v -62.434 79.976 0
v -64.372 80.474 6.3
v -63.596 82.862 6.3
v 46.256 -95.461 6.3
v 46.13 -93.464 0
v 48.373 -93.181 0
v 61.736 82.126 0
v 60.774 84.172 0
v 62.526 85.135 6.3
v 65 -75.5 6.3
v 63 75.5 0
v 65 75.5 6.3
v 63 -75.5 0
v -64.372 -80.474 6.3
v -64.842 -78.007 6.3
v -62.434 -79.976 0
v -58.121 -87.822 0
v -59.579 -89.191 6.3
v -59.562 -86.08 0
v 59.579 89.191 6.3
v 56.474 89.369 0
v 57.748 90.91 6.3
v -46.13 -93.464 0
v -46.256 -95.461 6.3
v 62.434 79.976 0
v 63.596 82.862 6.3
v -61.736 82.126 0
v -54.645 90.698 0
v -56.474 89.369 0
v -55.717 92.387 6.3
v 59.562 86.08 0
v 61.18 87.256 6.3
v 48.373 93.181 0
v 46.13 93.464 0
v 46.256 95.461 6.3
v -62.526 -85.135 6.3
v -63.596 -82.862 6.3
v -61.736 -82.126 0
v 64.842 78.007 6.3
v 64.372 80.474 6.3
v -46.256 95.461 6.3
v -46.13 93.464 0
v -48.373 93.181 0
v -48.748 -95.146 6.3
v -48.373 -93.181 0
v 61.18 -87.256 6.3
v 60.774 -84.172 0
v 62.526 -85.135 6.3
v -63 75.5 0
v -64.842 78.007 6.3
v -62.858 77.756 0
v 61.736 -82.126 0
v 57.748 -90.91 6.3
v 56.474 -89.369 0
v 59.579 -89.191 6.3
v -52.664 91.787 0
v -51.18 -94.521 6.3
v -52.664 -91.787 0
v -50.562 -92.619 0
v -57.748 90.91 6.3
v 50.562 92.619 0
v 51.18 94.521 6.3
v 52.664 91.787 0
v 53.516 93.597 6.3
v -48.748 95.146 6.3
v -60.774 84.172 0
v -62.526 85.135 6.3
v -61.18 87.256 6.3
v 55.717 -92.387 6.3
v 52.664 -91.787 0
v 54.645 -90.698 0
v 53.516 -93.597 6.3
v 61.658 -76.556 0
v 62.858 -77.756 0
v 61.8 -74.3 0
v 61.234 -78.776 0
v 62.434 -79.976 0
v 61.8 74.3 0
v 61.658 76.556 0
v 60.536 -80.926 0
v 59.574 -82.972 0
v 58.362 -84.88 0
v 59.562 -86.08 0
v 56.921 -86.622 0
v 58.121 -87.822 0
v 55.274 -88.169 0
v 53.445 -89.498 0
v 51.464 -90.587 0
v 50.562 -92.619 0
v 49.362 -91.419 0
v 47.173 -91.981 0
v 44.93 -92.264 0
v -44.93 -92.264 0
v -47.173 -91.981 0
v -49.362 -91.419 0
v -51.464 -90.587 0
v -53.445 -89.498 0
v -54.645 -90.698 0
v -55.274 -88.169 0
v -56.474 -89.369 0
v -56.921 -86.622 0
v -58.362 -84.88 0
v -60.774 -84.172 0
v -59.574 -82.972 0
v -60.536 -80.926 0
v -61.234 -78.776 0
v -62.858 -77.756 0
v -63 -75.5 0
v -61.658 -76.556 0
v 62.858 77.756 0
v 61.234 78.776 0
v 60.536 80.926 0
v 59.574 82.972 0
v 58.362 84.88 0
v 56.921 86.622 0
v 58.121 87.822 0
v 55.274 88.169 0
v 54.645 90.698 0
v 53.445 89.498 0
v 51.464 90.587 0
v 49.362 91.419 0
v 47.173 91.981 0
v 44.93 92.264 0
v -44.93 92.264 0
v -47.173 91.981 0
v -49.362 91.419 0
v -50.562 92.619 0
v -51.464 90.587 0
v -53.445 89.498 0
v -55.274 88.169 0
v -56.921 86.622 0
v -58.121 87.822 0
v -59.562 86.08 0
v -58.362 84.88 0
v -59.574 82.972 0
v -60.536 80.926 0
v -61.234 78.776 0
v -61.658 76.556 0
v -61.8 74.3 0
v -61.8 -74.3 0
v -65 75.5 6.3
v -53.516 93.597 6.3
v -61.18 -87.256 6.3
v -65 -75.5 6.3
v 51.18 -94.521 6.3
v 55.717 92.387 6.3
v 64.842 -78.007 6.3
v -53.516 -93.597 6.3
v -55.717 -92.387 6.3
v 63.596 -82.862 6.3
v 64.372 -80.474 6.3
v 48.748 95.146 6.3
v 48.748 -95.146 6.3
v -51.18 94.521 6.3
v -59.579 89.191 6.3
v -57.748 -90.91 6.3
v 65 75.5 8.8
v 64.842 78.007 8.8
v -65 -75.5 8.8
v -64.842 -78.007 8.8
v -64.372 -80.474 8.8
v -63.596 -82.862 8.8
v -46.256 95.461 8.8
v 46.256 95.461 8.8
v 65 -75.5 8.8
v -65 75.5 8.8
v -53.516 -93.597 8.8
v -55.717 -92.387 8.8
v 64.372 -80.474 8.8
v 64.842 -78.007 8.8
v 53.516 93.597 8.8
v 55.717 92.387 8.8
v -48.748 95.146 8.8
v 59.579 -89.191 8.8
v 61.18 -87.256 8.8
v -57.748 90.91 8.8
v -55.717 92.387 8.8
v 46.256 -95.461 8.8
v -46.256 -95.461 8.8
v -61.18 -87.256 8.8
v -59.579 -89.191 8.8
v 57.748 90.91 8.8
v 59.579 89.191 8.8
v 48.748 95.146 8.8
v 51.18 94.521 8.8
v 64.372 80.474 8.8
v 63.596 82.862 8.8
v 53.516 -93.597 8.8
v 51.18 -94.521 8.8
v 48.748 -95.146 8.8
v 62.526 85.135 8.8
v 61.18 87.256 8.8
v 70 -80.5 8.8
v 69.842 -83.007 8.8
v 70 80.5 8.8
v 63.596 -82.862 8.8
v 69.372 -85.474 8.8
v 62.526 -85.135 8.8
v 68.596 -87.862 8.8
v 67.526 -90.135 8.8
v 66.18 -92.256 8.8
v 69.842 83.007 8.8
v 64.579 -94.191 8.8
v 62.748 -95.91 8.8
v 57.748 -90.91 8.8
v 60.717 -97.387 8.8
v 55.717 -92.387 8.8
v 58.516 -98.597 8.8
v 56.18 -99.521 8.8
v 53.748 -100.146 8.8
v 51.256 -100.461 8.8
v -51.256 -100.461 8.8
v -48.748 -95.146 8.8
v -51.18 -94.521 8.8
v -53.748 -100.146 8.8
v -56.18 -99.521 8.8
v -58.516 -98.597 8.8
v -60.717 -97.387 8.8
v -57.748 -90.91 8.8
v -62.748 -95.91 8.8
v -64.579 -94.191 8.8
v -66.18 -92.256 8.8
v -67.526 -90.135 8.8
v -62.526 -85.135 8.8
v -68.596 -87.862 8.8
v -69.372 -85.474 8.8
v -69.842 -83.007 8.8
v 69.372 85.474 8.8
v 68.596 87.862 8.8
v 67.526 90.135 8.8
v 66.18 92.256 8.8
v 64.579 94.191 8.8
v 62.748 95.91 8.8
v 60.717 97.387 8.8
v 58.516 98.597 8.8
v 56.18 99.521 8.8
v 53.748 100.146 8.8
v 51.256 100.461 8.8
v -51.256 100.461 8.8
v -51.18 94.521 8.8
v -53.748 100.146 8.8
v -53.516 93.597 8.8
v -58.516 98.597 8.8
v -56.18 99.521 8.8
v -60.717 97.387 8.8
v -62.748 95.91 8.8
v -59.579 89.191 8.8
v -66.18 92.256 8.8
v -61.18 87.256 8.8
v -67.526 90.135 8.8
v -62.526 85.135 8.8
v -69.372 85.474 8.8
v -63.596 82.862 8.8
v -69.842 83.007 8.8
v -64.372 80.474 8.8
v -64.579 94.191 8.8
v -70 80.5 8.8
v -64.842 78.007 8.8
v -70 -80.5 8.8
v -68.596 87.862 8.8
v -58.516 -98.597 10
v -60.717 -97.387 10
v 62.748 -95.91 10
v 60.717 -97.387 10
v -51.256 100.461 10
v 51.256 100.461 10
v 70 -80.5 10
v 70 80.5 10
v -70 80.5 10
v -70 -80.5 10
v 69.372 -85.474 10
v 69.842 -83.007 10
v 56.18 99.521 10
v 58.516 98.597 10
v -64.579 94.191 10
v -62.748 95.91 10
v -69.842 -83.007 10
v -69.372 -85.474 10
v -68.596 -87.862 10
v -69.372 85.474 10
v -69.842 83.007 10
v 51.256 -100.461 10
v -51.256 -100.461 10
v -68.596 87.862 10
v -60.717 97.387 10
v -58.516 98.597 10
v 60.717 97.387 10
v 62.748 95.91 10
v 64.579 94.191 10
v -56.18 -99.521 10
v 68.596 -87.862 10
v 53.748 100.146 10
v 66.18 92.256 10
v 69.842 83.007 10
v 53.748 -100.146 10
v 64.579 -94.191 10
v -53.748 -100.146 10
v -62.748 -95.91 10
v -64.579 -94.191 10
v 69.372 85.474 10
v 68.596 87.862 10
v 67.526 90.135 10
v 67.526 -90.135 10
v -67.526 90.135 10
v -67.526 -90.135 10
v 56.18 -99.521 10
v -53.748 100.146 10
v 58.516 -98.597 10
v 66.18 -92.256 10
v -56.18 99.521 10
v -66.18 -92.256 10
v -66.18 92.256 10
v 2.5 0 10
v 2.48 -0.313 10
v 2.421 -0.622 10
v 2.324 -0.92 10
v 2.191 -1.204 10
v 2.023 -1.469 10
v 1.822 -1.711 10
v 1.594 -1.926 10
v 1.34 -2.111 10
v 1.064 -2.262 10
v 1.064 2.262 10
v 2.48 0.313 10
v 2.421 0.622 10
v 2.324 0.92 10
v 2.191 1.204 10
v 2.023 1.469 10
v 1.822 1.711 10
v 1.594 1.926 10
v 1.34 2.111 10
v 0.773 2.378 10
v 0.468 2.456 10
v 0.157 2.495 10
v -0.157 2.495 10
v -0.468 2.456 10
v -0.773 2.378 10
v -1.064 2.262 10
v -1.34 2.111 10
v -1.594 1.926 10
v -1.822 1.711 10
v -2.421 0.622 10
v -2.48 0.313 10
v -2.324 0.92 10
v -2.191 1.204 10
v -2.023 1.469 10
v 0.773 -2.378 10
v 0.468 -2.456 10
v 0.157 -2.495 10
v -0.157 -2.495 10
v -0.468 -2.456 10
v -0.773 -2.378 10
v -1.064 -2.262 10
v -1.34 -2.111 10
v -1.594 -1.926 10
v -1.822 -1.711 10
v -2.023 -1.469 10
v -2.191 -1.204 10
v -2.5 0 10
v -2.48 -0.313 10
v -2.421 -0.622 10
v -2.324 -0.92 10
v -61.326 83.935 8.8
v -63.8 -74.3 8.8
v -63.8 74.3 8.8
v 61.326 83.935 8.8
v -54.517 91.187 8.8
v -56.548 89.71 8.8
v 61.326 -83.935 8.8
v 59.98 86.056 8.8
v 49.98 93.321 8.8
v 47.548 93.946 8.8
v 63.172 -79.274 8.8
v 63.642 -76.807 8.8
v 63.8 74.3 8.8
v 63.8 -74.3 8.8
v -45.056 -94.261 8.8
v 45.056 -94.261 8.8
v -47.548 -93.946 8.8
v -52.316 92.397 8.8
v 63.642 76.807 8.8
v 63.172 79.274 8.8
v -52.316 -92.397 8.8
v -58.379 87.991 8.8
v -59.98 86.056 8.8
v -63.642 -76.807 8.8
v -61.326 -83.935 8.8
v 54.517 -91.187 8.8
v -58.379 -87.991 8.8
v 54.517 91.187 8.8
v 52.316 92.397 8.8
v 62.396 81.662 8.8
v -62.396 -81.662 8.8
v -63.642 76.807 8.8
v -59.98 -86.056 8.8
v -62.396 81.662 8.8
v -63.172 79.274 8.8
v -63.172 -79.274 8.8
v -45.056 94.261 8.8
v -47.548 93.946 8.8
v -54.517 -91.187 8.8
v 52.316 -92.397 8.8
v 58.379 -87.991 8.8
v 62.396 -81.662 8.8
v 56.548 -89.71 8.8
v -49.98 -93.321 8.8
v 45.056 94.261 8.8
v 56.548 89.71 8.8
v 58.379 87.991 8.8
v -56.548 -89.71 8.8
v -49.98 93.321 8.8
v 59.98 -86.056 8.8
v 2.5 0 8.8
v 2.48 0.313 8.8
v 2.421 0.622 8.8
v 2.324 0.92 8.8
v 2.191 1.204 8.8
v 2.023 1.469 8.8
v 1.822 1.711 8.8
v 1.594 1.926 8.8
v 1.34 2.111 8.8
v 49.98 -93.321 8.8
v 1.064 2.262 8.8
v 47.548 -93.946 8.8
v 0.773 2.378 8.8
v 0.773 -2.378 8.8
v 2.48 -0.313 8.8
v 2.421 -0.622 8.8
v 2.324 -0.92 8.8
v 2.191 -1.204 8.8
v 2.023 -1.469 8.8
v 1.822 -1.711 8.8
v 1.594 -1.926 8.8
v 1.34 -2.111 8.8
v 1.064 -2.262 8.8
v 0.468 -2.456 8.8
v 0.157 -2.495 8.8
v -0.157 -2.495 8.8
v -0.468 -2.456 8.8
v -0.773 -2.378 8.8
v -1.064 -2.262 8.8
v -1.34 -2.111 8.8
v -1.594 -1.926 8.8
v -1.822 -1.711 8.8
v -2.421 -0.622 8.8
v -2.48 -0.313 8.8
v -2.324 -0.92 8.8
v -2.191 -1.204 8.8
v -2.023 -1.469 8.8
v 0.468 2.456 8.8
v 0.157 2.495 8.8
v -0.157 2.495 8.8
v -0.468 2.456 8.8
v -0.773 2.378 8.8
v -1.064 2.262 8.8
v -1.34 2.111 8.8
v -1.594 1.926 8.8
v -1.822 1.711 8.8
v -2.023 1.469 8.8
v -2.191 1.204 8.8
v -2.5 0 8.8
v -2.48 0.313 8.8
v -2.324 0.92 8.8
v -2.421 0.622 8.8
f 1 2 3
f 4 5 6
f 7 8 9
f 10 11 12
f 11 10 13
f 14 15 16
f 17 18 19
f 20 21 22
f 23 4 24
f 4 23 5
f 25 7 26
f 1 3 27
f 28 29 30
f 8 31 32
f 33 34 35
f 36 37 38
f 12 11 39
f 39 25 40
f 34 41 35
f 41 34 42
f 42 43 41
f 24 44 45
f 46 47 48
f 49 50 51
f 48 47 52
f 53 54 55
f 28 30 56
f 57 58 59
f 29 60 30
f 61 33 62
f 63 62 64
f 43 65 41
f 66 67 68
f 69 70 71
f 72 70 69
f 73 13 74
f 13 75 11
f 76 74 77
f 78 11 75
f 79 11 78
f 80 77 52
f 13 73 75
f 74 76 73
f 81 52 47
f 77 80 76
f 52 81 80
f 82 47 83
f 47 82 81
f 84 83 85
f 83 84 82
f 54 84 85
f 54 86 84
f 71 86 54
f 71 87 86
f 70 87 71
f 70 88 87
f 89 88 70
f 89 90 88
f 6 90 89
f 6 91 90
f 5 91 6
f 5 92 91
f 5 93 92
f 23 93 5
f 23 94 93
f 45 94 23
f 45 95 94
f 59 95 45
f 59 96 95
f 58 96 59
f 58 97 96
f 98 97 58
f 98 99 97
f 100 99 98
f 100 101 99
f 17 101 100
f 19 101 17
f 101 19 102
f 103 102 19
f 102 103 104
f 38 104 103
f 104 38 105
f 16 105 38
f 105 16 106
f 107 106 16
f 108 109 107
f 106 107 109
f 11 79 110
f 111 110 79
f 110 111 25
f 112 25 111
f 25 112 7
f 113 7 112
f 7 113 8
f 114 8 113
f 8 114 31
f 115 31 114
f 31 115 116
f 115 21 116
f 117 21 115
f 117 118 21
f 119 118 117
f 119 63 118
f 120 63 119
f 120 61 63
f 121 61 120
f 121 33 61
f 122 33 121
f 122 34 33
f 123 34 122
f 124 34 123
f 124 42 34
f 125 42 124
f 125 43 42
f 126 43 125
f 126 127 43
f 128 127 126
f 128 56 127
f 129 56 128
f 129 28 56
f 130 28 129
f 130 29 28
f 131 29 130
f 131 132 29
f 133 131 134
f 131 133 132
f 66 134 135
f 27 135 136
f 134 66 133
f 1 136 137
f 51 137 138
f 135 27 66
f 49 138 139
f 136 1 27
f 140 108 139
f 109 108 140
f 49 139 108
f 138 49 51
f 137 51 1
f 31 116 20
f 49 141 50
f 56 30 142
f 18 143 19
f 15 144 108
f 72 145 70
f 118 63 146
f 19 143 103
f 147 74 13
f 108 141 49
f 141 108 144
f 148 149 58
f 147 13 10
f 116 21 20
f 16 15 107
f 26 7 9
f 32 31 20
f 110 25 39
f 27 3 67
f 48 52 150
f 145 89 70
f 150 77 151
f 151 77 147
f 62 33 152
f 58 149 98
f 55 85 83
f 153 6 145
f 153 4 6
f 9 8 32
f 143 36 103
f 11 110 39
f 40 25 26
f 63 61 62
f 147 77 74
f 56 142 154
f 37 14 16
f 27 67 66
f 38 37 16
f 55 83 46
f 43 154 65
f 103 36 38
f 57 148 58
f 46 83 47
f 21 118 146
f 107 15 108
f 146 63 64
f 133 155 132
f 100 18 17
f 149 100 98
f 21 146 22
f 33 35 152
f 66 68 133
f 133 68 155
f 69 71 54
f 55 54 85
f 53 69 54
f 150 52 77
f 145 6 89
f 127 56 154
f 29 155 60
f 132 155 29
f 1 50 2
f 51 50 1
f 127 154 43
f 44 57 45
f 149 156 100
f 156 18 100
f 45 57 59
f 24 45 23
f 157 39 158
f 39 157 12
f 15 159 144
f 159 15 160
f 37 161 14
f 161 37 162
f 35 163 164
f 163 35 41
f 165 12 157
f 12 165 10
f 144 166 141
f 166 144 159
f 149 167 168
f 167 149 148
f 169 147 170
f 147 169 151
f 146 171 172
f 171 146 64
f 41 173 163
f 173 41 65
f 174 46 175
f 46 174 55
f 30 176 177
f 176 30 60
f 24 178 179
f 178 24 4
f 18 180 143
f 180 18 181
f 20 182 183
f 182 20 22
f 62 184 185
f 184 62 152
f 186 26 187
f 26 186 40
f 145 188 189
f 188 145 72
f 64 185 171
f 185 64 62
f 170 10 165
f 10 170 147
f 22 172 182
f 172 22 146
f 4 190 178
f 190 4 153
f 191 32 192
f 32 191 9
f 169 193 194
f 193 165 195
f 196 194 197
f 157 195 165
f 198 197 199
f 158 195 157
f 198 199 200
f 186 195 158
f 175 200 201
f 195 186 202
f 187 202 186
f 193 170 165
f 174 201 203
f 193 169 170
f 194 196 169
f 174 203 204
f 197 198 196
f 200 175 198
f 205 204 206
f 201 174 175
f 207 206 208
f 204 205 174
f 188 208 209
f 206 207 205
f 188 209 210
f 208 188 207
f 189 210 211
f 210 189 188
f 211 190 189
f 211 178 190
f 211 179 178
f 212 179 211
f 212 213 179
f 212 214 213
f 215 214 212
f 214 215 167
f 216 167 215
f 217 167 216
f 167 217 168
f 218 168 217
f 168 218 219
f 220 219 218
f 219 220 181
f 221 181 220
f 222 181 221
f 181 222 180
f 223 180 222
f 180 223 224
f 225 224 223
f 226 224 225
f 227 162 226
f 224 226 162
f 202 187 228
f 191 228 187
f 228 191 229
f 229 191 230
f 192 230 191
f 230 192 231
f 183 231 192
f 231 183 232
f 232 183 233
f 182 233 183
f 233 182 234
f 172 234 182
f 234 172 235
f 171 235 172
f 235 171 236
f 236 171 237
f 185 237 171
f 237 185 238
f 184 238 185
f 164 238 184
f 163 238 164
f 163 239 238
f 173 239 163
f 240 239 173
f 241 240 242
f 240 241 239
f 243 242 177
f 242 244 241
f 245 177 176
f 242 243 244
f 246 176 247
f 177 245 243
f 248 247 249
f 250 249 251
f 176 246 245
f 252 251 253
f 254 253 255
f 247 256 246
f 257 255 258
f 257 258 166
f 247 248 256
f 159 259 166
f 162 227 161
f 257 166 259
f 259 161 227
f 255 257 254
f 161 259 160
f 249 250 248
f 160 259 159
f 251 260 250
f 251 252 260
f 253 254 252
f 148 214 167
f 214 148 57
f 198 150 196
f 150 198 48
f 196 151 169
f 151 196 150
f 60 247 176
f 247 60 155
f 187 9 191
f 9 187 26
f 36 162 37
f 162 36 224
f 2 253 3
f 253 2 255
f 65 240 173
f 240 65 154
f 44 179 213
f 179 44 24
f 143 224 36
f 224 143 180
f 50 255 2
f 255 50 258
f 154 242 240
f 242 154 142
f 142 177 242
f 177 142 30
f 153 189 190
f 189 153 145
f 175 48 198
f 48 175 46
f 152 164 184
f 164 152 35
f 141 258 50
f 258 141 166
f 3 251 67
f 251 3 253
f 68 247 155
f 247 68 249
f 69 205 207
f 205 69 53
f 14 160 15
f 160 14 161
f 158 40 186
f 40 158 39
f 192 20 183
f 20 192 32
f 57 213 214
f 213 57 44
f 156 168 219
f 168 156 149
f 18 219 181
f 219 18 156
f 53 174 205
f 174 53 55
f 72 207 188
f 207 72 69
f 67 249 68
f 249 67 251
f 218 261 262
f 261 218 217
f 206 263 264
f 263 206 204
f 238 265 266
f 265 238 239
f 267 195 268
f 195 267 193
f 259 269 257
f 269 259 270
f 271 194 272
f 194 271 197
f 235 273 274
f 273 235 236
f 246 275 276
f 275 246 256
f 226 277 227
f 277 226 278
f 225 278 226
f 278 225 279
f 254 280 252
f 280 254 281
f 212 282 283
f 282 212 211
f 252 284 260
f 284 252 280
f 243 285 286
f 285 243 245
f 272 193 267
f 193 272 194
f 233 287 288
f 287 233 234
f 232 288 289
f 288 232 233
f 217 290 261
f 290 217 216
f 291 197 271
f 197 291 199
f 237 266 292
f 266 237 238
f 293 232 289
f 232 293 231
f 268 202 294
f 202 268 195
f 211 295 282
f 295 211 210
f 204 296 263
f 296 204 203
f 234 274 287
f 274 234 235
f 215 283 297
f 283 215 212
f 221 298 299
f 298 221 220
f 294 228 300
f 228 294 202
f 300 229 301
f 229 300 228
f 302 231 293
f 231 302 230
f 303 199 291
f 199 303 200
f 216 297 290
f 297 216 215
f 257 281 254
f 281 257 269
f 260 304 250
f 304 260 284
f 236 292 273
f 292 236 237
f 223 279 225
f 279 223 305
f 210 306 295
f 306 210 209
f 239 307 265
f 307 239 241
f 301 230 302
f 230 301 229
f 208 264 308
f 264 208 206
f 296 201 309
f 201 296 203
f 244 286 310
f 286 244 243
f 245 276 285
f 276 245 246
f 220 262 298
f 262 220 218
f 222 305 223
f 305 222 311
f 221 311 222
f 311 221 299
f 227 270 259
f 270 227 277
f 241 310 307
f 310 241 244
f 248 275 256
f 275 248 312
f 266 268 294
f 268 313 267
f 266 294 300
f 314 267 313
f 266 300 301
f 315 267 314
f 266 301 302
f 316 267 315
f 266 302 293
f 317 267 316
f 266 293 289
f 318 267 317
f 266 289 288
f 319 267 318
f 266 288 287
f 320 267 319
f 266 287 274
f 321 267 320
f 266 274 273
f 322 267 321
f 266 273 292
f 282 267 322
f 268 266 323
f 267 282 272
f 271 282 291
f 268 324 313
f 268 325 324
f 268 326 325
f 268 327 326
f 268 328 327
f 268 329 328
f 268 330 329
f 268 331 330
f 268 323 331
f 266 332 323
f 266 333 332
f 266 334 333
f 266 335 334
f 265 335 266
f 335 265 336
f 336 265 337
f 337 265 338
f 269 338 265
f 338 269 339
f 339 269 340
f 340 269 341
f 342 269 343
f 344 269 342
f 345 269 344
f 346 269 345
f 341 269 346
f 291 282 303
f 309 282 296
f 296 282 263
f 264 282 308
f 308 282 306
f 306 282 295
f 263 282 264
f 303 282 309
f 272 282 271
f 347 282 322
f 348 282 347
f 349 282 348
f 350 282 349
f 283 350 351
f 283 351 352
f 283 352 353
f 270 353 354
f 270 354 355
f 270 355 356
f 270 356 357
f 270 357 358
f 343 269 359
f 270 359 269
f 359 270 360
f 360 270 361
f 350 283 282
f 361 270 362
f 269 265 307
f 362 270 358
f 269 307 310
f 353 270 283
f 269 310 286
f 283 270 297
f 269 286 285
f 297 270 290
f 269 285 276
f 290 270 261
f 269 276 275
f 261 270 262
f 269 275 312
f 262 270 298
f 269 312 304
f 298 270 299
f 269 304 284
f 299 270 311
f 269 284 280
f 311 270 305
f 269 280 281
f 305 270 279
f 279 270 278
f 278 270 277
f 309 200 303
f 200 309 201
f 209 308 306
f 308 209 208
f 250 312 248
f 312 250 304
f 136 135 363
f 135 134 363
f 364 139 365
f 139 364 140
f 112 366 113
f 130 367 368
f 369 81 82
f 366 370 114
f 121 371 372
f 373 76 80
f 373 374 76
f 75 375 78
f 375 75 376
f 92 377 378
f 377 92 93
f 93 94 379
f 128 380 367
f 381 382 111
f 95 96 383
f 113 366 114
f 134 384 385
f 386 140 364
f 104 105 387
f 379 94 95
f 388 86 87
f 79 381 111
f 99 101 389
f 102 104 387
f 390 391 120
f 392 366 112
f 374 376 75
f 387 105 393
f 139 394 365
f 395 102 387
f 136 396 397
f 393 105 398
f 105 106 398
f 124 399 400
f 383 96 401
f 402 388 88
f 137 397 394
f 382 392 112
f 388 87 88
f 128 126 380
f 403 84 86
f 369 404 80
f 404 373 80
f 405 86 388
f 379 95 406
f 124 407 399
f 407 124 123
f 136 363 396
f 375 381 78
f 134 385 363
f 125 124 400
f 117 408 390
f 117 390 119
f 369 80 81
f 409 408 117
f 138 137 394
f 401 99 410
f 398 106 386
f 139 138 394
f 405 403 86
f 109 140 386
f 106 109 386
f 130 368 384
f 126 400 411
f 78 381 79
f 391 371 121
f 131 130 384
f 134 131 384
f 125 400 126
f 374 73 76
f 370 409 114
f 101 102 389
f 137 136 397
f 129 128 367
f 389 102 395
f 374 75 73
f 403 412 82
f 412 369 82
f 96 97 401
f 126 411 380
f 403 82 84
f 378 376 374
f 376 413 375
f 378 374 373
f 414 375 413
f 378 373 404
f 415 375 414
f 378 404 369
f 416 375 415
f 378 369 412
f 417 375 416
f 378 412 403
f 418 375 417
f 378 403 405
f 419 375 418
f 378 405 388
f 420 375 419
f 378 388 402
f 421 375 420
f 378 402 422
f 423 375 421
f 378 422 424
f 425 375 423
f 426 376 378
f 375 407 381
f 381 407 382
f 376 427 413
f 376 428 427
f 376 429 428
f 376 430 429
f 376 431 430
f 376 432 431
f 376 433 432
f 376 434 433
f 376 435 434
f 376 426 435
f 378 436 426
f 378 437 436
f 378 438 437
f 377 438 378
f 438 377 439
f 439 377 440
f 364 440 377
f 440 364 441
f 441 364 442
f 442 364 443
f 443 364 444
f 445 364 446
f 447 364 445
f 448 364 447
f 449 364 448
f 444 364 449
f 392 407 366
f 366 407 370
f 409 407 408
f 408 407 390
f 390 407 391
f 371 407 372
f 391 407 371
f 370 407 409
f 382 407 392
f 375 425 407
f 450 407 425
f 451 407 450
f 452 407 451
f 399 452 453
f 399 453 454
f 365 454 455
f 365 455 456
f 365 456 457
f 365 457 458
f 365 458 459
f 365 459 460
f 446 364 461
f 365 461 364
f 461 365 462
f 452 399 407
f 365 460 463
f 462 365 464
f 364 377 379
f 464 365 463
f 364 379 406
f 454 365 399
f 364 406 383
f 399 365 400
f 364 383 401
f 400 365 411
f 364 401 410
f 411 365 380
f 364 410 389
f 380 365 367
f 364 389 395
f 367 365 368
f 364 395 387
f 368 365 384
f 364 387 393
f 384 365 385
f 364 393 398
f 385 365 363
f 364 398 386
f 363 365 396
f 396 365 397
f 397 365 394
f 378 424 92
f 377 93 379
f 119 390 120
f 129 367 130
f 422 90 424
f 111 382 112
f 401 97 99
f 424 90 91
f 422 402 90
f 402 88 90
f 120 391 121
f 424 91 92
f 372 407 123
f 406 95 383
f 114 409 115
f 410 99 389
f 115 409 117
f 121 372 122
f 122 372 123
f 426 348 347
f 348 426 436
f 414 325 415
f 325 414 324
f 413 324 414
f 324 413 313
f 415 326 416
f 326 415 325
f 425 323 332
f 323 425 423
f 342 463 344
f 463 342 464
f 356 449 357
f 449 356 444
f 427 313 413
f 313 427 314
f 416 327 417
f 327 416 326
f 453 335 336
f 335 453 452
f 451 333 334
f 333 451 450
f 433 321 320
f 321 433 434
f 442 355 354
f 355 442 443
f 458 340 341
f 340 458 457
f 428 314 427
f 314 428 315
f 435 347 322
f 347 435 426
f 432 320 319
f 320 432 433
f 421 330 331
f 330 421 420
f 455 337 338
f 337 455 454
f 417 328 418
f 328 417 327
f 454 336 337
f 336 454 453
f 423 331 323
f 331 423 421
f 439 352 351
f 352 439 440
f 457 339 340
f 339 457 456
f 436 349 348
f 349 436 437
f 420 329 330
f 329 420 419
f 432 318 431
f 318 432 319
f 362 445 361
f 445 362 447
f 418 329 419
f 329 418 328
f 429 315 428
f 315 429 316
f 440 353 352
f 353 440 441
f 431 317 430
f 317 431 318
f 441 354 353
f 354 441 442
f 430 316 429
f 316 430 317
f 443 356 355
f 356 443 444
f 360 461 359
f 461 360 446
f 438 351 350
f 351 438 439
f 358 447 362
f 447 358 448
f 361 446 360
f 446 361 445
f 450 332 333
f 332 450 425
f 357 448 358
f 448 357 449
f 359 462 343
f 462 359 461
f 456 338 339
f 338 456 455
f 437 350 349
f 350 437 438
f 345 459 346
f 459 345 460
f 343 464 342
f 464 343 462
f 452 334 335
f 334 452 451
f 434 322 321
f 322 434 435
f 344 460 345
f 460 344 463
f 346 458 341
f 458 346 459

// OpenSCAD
WALL_THICKNESS = 1.2;

KNOB_HOLE_DIA = 5;
LIP_WIDTH = 5;
LIP_HEIGHT = 2.5;

WIDTH = 130;
LENGTH = 191;
HEIGHT = 10;
CORNER_DIA_BOT = 36;
CORNER_DIA_TOP = 40;

$fn = 50;

module rounded_rect(width, length, height, corner_dia_bot, corner_dia_top) {
  hull() {
    for(i = [-1, 1]) {
      for(j = [-1, 1]) {
        translate([i * (width - corner_dia_top)/2, j * (length - corner_dia_top)/2, 0])
        cylinder(d1 = corner_dia_bot, d2 = corner_dia_top, h = height);
      }
    }
  }
}

module lid() {
  wt = 2 * WALL_THICKNESS;
  difference() {
    union() {
      rounded_rect(WIDTH, LENGTH, HEIGHT - LIP_HEIGHT - wt/2, CORNER_DIA_BOT, CORNER_DIA_TOP);

      translate([0, 0, HEIGHT - LIP_HEIGHT - wt/2])
      rounded_rect(WIDTH, LENGTH, LIP_HEIGHT, CORNER_DIA_TOP, CORNER_DIA_TOP);

      translate([0, 0, HEIGHT - wt/2])
      rounded_rect(WIDTH + 2 * LIP_WIDTH, LENGTH + 2 * LIP_WIDTH, wt/2, CORNER_DIA_TOP, CORNER_DIA_TOP);
    }
    rounded_rect(WIDTH - wt, LENGTH - wt, HEIGHT - wt/2, CORNER_DIA_BOT, CORNER_DIA_TOP);

    cylinder(d = KNOB_HOLE_DIA, h = HEIGHT);
  }
}

lid();
